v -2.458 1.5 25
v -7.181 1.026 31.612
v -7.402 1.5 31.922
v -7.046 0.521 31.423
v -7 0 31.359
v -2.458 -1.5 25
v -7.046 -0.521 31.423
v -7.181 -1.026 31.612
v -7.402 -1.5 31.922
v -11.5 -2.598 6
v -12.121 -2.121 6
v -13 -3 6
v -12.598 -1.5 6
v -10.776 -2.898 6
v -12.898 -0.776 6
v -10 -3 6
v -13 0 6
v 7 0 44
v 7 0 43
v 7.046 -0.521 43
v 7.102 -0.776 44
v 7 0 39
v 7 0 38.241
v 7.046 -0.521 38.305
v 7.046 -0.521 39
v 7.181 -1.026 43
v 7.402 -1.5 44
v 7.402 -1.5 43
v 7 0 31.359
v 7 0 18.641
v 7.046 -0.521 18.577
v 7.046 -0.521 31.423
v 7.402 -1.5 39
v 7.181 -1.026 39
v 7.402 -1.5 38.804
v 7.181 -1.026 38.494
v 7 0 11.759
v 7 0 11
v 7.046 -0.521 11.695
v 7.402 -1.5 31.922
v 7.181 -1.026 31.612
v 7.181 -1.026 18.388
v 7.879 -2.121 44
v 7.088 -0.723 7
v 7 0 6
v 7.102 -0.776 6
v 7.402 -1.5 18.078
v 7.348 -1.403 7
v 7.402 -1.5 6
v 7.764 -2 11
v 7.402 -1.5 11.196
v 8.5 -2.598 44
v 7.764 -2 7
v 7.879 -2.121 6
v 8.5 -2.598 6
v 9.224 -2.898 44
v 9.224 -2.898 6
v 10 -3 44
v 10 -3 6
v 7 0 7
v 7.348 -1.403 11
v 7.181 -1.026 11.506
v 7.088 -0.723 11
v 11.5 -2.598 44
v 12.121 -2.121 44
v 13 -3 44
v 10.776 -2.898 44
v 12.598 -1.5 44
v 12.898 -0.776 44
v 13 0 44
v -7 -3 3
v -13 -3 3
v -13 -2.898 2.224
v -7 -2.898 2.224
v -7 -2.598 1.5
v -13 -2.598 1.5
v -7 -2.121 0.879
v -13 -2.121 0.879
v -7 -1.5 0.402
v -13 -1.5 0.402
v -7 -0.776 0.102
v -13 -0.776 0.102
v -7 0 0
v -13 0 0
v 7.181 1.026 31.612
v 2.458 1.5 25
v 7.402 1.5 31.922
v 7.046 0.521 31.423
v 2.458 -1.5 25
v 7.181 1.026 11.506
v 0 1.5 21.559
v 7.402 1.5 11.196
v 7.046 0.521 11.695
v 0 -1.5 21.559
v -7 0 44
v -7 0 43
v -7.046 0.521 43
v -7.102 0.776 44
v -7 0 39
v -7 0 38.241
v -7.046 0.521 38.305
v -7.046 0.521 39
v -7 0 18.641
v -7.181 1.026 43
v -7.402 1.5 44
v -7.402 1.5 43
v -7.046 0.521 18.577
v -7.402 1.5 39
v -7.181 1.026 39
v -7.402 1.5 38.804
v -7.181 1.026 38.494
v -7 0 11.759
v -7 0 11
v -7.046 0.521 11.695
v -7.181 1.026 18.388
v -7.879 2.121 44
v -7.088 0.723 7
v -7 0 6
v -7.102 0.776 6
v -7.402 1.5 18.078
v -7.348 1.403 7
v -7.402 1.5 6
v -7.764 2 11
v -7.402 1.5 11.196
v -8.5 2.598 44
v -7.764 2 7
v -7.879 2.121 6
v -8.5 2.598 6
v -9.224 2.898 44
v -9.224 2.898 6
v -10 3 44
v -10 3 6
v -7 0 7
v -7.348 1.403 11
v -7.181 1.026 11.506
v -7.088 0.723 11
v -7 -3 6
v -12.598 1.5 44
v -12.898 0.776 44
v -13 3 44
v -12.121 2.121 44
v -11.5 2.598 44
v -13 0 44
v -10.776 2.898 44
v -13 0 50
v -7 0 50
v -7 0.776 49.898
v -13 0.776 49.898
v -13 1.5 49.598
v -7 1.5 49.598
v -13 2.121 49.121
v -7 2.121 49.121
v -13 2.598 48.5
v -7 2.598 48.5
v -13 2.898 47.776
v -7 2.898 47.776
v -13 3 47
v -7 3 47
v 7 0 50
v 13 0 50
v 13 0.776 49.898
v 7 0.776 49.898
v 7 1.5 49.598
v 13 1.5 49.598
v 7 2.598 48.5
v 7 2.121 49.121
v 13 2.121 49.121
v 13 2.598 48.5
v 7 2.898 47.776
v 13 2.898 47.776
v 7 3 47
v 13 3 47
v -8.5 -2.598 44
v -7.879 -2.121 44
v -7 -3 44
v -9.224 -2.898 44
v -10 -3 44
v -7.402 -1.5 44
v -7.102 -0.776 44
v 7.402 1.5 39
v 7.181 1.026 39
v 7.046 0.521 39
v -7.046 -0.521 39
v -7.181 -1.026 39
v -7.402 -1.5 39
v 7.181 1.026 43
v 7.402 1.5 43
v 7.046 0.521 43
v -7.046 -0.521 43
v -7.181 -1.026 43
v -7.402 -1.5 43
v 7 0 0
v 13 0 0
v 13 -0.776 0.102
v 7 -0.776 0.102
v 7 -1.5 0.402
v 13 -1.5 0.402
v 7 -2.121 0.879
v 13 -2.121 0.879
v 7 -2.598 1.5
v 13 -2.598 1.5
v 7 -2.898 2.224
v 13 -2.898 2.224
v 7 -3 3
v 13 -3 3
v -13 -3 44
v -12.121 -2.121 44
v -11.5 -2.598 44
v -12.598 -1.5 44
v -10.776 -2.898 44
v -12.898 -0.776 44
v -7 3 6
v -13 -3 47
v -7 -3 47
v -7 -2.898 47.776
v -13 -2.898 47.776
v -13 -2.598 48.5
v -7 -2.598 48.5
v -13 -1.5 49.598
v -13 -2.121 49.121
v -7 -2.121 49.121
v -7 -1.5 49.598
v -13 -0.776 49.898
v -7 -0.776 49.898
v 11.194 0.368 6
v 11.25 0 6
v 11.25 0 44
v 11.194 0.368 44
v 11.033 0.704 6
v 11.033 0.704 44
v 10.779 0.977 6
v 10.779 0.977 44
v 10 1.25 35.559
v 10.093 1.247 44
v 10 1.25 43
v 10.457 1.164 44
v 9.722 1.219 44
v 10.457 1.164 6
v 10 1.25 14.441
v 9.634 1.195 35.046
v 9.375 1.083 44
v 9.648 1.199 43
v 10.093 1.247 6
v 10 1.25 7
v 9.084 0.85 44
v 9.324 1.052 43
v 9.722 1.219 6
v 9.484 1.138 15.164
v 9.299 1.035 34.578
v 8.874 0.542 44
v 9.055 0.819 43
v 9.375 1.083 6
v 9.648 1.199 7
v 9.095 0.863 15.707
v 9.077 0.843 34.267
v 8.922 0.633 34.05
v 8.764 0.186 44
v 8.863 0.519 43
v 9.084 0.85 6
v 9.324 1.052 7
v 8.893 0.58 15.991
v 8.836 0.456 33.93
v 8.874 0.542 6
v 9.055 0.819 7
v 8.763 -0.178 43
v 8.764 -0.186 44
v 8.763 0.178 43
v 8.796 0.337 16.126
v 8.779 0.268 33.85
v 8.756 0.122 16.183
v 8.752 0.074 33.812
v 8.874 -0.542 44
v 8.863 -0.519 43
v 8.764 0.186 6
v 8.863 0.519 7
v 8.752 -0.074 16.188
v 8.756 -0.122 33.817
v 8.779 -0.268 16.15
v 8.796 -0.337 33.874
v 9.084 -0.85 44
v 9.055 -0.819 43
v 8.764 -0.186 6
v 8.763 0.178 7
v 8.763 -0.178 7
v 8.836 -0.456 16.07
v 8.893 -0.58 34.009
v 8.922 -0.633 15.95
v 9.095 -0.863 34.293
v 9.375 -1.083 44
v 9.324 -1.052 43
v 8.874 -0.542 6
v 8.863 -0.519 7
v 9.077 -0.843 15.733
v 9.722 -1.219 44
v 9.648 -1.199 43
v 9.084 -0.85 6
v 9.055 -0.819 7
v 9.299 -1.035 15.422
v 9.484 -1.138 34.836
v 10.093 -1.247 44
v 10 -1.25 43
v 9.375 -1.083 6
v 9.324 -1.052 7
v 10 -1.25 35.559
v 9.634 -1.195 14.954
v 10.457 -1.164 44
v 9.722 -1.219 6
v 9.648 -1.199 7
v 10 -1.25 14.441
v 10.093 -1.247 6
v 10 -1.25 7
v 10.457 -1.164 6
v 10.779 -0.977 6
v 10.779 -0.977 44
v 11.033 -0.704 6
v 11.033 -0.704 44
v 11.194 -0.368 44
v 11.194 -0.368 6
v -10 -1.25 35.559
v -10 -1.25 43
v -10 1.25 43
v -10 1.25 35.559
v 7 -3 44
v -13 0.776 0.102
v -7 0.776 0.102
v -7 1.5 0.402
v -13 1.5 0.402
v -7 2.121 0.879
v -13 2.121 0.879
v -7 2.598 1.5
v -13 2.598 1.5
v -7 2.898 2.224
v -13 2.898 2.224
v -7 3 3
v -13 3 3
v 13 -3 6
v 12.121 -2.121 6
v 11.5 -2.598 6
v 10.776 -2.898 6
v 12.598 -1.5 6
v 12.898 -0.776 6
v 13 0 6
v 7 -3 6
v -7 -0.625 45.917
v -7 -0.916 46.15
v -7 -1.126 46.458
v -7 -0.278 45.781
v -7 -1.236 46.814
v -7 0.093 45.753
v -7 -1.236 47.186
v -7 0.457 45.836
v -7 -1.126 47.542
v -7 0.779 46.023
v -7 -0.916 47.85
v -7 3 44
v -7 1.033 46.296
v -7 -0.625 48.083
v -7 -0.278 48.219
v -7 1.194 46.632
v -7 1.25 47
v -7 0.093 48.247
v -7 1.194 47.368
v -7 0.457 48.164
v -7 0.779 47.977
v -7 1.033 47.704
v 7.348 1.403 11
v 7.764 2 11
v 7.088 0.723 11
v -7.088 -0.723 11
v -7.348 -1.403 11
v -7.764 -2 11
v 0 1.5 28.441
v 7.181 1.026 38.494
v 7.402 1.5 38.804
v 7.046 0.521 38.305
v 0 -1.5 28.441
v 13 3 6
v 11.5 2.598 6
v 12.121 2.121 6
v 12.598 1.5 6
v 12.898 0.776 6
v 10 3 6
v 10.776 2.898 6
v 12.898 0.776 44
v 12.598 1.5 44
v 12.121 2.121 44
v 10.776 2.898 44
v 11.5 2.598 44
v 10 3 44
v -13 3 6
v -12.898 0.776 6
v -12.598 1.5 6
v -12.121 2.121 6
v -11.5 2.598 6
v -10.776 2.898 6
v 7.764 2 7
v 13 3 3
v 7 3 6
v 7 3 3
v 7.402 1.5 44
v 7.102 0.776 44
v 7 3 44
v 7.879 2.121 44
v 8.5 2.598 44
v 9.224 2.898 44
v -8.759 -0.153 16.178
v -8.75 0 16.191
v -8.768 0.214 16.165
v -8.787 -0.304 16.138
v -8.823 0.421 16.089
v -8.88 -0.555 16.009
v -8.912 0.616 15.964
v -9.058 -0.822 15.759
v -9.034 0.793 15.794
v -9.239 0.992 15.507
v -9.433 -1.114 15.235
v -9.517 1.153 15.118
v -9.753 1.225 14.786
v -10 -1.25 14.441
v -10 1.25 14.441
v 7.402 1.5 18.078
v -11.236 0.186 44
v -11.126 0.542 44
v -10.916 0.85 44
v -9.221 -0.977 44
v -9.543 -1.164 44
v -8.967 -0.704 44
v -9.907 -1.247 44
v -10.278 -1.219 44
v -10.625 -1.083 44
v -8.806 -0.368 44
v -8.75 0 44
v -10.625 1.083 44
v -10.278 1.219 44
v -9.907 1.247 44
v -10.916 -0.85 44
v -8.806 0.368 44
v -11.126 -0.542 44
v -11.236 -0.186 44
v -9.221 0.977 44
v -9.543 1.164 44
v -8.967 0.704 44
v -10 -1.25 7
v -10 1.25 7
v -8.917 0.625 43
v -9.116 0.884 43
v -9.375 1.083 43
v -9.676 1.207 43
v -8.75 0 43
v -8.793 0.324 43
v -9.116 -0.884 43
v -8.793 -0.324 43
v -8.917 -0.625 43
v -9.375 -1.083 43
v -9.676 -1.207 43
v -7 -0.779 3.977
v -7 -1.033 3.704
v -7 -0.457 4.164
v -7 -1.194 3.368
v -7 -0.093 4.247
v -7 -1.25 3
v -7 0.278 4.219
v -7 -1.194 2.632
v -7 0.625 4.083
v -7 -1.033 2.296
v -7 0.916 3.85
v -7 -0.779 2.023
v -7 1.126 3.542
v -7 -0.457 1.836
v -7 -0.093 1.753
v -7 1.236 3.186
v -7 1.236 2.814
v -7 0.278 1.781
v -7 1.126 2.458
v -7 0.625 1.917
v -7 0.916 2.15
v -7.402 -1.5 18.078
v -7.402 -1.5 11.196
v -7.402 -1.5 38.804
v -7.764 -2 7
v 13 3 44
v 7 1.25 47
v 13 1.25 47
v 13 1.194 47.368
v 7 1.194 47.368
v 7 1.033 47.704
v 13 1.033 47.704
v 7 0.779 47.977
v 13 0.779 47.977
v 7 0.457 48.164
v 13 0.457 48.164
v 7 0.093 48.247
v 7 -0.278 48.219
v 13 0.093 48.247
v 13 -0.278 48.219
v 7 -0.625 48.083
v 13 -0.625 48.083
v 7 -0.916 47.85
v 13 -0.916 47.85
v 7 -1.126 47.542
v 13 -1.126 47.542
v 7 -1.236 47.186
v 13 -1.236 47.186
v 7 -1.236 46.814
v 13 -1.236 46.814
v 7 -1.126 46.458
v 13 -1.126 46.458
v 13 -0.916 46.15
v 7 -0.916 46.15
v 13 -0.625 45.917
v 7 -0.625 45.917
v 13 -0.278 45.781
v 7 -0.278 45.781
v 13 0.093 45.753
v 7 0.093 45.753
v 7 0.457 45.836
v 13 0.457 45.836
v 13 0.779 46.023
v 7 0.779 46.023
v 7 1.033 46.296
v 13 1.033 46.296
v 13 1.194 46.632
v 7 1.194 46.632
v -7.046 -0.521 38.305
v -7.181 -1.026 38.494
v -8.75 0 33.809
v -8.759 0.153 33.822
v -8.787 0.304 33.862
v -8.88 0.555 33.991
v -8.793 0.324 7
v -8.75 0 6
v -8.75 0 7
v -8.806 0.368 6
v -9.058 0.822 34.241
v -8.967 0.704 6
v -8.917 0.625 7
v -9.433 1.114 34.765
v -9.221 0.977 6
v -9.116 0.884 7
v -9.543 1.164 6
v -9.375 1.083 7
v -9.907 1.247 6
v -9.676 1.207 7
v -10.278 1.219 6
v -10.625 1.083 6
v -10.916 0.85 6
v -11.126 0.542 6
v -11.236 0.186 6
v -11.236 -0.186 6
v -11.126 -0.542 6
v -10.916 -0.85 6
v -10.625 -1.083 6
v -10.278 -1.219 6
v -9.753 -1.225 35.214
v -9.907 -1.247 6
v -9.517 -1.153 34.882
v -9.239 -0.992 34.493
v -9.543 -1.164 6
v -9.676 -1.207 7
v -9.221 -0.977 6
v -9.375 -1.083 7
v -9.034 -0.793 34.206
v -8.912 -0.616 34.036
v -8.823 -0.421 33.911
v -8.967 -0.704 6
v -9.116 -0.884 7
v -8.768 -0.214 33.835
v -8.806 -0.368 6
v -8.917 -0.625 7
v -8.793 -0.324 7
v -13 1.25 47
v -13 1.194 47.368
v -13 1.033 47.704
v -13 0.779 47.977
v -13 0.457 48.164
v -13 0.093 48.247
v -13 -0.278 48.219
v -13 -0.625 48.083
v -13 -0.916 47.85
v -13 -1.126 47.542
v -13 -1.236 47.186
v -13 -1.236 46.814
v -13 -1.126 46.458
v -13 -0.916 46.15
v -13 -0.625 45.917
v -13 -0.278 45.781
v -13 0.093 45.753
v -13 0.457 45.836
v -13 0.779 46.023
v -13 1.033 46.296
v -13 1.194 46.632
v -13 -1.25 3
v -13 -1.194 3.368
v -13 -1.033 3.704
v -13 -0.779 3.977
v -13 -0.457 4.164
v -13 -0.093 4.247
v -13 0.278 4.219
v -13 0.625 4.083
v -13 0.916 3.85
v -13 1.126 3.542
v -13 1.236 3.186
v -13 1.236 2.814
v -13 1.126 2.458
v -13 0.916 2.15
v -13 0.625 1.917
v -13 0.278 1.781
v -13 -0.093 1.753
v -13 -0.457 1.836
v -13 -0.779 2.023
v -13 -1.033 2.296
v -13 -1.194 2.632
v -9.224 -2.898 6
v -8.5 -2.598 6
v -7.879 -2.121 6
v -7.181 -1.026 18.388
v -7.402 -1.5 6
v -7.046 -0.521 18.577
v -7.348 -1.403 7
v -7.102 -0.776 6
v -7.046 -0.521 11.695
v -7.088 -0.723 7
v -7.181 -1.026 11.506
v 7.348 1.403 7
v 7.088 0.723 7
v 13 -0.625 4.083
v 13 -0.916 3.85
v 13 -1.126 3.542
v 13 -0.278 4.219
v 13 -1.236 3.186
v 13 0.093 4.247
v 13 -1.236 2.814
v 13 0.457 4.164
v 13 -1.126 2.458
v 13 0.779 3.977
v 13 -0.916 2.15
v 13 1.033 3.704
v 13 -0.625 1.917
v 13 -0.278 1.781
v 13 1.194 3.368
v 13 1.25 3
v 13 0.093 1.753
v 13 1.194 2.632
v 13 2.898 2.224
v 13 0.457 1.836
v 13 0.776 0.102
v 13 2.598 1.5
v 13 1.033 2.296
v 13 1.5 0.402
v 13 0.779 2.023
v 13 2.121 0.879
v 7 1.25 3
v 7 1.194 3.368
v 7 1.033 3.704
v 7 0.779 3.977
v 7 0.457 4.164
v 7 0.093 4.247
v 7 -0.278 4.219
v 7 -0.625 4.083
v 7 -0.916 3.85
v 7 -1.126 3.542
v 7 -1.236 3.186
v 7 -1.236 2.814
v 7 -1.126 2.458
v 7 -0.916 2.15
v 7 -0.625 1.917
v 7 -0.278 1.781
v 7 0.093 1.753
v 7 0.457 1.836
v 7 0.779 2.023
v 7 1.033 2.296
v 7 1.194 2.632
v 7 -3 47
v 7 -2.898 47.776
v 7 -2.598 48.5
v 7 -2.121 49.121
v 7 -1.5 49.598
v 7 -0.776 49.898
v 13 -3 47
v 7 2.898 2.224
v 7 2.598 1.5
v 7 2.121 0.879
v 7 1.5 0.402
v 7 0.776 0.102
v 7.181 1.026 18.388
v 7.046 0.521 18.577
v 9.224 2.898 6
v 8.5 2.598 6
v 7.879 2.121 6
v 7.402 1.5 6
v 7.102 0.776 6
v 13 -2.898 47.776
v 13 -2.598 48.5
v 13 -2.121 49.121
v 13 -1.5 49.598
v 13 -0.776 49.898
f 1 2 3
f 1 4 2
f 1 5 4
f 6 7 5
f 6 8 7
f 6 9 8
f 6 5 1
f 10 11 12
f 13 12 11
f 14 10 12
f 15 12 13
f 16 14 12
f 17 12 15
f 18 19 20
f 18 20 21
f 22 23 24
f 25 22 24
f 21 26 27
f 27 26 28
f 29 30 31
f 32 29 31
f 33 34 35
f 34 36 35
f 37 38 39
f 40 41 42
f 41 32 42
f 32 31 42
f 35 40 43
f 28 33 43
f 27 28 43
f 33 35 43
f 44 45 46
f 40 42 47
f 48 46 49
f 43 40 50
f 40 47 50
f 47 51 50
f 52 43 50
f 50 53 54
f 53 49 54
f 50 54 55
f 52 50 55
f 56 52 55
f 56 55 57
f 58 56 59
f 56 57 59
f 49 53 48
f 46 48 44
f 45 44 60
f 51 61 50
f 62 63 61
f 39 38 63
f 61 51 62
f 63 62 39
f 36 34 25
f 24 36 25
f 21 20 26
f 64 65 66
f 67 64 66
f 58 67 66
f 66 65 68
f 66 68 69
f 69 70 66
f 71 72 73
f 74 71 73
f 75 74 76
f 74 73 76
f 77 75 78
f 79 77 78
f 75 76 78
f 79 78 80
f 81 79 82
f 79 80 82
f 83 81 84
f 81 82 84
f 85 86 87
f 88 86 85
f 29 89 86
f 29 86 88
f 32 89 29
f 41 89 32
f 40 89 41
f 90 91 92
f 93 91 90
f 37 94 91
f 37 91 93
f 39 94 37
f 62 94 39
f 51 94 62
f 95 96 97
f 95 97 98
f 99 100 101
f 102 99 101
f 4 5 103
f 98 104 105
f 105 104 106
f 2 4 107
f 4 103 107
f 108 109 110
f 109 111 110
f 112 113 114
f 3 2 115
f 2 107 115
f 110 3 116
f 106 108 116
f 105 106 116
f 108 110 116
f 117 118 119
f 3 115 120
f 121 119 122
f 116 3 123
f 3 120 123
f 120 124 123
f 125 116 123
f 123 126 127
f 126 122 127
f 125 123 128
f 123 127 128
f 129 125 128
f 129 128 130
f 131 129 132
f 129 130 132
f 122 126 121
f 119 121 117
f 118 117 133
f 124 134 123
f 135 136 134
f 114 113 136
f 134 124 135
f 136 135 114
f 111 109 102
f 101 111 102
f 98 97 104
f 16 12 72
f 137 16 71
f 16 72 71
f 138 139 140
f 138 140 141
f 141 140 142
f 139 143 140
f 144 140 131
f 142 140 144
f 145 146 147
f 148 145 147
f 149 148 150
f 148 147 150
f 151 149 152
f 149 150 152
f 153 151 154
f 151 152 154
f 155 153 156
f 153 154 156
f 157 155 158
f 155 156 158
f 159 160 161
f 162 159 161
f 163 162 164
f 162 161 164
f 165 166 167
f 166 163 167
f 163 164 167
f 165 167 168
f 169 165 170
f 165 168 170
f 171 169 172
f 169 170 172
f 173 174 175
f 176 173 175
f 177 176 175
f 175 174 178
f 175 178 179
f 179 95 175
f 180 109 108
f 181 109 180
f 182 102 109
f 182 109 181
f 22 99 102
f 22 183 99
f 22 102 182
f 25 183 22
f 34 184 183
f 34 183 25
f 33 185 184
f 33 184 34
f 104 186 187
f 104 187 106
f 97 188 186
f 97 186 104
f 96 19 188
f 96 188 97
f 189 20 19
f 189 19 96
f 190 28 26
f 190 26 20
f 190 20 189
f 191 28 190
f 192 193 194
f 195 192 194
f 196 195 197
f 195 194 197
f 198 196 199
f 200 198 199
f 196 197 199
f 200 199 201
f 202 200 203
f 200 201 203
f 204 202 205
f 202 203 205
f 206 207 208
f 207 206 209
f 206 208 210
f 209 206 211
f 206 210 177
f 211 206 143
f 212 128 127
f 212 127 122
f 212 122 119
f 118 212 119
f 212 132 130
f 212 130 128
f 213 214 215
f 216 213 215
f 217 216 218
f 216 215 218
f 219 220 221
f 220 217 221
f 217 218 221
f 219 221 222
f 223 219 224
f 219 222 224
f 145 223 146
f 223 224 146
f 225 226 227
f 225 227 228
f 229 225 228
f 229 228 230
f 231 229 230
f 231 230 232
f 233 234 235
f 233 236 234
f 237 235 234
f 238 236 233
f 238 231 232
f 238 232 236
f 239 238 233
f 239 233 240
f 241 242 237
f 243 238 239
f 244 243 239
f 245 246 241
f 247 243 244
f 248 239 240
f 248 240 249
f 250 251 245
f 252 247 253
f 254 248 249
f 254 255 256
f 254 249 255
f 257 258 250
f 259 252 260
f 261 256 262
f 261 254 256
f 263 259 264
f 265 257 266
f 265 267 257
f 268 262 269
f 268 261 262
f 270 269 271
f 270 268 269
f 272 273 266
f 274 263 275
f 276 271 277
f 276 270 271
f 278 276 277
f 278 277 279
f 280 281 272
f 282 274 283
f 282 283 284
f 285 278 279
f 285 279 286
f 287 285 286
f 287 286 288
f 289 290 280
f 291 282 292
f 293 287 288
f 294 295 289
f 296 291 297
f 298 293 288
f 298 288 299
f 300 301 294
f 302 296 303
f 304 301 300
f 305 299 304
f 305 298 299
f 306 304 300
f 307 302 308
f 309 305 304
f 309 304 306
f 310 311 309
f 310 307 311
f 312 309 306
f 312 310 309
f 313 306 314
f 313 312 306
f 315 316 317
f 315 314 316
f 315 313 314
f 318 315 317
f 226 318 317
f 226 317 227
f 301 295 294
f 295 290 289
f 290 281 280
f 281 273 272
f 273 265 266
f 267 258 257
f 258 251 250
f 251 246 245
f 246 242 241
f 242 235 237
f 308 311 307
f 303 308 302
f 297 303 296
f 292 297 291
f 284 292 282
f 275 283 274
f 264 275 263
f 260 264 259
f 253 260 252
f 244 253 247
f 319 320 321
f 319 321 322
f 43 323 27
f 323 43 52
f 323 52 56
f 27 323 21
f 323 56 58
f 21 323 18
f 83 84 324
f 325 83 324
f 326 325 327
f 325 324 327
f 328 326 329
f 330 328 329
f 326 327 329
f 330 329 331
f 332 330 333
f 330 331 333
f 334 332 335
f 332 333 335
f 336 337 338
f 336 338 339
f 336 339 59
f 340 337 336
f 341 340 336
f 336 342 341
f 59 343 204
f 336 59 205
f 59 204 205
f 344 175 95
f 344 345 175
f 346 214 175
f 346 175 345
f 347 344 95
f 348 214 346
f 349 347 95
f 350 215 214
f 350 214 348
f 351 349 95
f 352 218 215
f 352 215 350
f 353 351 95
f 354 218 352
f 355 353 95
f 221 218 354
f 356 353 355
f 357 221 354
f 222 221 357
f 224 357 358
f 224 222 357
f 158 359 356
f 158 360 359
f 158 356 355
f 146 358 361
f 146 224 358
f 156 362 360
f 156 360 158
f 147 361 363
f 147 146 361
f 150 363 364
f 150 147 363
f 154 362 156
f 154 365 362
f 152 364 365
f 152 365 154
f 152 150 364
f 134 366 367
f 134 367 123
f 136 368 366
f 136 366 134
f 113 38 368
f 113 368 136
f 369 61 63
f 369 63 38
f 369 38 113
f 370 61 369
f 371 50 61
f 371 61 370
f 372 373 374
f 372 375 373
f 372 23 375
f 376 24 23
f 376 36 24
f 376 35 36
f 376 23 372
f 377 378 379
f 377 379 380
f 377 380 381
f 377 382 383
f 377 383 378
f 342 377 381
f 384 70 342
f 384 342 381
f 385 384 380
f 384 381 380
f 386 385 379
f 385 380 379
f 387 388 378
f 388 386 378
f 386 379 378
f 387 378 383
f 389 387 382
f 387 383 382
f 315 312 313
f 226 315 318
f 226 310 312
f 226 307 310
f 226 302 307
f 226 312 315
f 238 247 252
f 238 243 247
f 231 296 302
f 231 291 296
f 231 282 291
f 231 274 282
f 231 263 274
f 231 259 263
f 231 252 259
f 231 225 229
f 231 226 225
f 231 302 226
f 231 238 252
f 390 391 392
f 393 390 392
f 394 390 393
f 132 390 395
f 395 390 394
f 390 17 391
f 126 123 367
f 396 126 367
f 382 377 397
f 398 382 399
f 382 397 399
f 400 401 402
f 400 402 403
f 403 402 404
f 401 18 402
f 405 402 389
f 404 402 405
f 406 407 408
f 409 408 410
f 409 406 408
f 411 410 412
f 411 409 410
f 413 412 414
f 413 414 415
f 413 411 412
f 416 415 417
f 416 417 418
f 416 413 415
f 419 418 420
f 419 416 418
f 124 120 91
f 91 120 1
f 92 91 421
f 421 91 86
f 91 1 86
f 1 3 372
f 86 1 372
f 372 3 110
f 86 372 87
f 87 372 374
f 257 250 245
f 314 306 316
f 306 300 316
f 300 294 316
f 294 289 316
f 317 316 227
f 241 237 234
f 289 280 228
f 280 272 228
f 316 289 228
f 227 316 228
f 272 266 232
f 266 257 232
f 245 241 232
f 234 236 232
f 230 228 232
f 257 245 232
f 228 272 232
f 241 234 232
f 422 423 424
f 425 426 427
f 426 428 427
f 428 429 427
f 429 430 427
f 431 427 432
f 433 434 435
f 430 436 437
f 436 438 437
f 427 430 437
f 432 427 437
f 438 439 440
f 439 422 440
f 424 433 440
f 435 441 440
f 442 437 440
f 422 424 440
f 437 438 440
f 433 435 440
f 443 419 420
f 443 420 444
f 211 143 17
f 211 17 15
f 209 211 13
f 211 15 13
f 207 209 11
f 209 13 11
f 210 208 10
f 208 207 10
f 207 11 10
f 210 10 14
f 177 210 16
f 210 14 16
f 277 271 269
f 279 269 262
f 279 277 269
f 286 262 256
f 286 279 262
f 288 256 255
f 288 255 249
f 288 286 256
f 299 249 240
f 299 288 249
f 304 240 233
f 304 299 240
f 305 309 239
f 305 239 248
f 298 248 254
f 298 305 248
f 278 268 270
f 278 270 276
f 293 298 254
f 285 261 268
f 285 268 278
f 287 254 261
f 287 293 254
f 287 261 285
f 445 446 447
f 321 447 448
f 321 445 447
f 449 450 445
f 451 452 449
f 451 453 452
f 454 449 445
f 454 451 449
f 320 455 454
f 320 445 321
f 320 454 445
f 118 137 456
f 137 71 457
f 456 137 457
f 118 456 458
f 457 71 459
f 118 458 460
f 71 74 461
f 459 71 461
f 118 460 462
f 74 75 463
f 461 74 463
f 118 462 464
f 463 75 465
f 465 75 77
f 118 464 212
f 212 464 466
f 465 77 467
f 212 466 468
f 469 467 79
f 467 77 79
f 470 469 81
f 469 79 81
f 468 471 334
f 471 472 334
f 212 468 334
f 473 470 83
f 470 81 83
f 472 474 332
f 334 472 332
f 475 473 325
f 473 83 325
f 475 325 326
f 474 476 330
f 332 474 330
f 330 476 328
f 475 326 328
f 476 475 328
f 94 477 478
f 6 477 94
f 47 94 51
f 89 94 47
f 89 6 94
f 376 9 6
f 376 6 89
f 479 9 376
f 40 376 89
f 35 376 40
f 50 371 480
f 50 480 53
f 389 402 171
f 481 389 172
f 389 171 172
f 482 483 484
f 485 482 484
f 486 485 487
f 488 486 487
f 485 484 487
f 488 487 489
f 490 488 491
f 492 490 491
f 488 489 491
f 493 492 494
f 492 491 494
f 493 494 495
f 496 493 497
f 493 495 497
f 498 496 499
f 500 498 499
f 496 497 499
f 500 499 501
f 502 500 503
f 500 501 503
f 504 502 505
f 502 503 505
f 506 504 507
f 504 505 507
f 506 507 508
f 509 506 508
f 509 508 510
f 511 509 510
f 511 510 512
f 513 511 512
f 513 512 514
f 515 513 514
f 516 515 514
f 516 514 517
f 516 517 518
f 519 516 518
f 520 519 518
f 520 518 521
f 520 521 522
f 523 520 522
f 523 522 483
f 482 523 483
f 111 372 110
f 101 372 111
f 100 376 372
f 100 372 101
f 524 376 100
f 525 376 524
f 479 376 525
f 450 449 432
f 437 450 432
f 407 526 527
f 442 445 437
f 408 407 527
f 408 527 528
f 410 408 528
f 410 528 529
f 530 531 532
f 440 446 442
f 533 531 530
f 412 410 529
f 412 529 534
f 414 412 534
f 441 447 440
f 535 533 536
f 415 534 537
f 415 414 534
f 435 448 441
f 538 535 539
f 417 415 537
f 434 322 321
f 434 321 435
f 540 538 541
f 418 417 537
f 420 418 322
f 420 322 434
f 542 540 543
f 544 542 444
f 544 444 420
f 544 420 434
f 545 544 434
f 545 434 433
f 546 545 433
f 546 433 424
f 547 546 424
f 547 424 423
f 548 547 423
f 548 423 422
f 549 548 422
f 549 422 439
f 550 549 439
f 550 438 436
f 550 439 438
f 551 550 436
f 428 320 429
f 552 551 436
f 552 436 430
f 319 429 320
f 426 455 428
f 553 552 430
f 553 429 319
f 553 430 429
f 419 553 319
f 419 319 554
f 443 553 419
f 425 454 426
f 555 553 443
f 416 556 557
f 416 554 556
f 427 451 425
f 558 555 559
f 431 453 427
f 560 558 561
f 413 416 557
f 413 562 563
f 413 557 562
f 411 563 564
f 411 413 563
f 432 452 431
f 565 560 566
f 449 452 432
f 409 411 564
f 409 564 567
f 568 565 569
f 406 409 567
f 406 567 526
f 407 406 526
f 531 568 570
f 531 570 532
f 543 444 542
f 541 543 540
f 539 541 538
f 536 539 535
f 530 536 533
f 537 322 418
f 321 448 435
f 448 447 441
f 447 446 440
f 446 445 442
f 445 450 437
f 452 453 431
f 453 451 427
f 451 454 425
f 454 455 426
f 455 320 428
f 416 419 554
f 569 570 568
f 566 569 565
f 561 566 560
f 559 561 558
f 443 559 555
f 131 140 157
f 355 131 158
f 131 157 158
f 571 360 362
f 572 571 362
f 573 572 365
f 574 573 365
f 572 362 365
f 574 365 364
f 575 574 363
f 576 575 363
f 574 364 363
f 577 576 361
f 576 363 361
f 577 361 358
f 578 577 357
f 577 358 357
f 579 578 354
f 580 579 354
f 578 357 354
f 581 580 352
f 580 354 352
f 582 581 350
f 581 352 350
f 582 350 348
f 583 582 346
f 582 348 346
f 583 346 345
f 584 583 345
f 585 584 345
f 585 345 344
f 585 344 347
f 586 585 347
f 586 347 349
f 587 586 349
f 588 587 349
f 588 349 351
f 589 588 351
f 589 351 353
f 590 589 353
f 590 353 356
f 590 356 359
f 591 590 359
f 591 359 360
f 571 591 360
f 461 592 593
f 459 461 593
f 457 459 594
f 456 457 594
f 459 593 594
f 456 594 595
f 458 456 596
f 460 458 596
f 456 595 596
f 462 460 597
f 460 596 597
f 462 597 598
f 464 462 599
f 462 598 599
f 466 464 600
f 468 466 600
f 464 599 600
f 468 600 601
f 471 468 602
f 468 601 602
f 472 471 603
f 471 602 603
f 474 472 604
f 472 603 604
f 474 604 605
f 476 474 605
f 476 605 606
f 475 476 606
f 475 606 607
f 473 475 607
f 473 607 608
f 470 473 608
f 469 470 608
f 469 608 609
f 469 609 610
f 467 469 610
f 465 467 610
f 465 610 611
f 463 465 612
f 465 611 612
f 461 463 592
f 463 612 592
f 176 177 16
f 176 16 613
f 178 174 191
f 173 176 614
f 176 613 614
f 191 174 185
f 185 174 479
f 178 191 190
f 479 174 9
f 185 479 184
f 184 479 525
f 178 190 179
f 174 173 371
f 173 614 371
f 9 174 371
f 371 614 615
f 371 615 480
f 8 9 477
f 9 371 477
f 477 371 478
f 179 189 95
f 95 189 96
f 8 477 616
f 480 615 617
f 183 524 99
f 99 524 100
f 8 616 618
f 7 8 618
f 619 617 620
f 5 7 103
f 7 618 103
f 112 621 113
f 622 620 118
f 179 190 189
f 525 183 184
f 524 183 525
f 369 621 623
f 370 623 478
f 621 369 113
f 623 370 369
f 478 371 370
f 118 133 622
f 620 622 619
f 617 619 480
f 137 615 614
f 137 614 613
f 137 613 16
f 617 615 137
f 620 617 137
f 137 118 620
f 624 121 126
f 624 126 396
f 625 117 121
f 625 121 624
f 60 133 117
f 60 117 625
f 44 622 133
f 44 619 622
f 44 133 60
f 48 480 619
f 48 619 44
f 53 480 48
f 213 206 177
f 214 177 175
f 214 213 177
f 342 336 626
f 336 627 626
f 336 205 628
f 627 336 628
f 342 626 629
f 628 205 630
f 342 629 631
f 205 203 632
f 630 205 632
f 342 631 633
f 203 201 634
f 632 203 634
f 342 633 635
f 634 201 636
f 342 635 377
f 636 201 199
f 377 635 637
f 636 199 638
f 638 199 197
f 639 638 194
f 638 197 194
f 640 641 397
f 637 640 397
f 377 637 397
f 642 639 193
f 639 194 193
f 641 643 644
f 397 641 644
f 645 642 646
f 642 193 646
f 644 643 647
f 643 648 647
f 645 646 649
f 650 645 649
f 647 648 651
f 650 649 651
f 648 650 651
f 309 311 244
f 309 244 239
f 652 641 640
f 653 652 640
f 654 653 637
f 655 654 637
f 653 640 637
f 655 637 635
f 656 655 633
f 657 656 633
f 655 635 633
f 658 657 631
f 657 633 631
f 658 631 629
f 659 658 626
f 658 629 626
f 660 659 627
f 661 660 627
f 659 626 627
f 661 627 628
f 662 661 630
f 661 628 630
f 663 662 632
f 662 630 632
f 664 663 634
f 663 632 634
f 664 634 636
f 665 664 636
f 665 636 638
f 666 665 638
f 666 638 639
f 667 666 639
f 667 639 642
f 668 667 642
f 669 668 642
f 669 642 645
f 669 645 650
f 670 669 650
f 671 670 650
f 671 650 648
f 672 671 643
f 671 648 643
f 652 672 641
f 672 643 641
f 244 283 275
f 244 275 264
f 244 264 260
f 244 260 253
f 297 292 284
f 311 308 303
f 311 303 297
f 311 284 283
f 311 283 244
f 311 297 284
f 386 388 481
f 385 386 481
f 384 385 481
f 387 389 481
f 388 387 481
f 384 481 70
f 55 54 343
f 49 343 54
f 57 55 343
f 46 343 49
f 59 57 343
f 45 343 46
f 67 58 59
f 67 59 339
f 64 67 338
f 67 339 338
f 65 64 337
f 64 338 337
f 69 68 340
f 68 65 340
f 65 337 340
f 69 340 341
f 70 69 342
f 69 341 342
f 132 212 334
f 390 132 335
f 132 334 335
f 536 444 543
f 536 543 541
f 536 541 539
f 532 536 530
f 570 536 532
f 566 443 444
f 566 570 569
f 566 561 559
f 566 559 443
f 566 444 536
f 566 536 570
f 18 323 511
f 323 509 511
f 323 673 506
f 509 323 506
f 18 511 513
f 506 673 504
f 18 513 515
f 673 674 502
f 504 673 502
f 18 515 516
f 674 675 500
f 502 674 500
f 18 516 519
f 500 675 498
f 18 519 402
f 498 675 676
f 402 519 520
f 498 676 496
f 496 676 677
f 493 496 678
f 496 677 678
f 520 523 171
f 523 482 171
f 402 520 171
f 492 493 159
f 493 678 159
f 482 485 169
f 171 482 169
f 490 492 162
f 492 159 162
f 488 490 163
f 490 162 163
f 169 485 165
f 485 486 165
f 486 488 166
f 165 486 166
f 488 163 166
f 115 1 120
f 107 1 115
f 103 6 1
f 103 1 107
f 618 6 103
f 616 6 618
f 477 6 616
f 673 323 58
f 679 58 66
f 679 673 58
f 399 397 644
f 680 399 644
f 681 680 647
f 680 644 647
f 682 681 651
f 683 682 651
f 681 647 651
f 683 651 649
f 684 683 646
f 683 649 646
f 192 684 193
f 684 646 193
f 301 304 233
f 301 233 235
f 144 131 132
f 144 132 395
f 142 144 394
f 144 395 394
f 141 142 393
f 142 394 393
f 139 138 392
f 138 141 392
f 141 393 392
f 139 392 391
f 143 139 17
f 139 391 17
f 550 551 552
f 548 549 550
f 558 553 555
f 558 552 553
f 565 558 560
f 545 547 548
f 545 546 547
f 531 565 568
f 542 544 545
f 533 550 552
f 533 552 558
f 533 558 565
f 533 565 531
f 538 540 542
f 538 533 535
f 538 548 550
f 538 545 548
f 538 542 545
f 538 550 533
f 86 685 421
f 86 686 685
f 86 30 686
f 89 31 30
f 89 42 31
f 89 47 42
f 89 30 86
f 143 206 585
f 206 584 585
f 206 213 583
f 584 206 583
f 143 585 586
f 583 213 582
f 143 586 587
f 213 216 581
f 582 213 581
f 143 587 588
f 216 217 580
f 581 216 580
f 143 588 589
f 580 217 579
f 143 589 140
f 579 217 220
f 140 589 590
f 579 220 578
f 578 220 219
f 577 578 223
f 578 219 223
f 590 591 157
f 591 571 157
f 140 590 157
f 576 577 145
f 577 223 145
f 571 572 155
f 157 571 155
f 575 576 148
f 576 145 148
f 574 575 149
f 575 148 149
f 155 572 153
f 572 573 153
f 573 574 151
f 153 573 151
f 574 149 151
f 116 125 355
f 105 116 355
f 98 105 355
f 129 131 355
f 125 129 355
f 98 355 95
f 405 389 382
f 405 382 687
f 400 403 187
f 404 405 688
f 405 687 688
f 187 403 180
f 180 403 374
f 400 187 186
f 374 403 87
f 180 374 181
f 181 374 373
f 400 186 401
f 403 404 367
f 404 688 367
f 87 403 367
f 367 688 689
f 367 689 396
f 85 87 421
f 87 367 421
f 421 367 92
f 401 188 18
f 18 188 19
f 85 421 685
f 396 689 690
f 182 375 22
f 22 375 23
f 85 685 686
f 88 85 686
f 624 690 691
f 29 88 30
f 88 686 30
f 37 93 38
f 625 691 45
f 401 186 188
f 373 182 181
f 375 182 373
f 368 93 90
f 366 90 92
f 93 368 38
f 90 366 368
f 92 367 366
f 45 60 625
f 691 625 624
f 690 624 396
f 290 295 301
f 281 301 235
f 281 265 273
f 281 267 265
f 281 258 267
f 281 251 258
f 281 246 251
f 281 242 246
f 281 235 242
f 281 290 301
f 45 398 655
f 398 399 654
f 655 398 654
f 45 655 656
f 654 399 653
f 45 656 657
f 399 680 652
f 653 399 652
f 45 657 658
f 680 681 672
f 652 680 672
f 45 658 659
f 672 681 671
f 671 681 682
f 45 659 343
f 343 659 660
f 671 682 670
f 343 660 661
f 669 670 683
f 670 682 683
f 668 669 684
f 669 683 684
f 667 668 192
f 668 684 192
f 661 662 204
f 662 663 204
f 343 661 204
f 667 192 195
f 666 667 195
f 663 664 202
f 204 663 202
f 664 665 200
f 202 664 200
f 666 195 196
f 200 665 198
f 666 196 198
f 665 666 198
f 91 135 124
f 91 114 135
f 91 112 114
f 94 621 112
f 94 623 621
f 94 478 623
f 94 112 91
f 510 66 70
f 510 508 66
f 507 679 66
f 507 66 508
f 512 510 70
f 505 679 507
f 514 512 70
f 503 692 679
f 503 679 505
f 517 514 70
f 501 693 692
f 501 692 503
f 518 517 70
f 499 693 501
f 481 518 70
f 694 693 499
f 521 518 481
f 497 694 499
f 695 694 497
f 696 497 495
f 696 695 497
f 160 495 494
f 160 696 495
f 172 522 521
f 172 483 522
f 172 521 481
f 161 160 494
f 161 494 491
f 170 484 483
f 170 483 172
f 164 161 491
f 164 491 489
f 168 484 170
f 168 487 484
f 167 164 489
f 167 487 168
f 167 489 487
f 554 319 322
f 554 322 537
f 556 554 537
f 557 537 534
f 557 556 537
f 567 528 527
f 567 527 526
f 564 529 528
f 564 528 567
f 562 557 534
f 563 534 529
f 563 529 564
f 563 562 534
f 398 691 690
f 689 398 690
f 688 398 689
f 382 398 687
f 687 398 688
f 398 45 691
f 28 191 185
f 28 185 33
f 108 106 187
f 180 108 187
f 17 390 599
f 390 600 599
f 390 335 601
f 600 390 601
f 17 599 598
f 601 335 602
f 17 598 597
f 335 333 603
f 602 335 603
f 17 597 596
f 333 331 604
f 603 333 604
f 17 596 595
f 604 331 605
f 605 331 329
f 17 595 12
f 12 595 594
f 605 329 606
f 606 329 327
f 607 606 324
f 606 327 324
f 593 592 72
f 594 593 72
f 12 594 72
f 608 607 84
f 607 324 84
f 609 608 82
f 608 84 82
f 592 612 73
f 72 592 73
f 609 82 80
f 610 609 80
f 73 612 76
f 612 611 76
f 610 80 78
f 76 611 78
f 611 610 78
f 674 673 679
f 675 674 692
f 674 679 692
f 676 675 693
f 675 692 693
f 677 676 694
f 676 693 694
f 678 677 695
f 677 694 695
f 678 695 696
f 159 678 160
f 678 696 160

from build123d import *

# Parameters (mm, degrees)
F0_R      = 1.25
F1_DEPTH  = 6
F2_DEPTH  = 50
F3_DEPTH  = 50
F4_R      = 1.25
F5_DEPTH  = 6
F6_R      = 1.25
F7_DEPTH  = 6
F9_DEPTH  = 2
F11_DEPTH = 1.5
F10_W     = 6
F10_H     = 6
F12_DEPTH = 6
F13_R     = 1.25
F14_DEPTH = 30


with BuildPart() as f1:
    # F0 (on Top) → F1 (new body)
    with BuildSketch(Plane.XY):
        with BuildLine():
            ThreePointArc((10, -3), (12.1213203436, -2.1213203436), (13, 0))
            ThreePointArc((13, 0), (12.1213203436, 2.1213203436), (10, 3))
            ThreePointArc((10, 3), (7.8786796564, 2.1213203436), (7, 0))
            ThreePointArc((7, 0), (7.8786796564, -2.1213203436), (10, -3))
        make_face()
        with Locations((10, 0)):
            Circle(F0_R, mode=Mode.SUBTRACT)
        with BuildLine():
            ThreePointArc((7, 0), (7.8786796564, 2.1213203436), (10, 3))
            Line((10, 3), (7, 3))
            Line((7, 3), (7, 0))
        make_face()
        with BuildLine():
            Line((7, -3), (10, -3))
            ThreePointArc((10, -3), (7.8786796564, -2.1213203436), (7, 0))
            Line((7, 0), (7, -3))
        make_face()
        with BuildLine():
            Line((13, -3), (13, 0))
            ThreePointArc((13, 0), (12.1213203436, -2.1213203436), (10, -3))
            Line((10, -3), (13, -3))
        make_face()
        with BuildLine():
            ThreePointArc((10, 3), (12.1213203436, 2.1213203436), (13, 0))
            Line((13, 0), (13, 3))
            Line((13, 3), (10, 3))
        make_face()
        with Locations((10, 0)):
            Circle(F0_R)
    extrude(amount=F1_DEPTH)

    # F0 (on Top) → F2 (join)
    with BuildSketch(Plane.XY):
        with BuildLine():
            ThreePointArc((10, -3), (12.1213203436, -2.1213203436), (13, 0))
            ThreePointArc((13, 0), (12.1213203436, 2.1213203436), (10, 3))
            ThreePointArc((10, 3), (7.8786796564, 2.1213203436), (7, 0))
            ThreePointArc((7, 0), (7.8786796564, -2.1213203436), (10, -3))
        make_face()
        with Locations((10, 0)):
            Circle(F0_R, mode=Mode.SUBTRACT)
    extrude(amount=F2_DEPTH)

    # F4 (on face) → F5 (cut)
    with BuildSketch(Plane.YZ.offset(13)):
        with Locations((0, 3)):
            Circle(F4_R)
        with BuildLine():
            Line((-3, 0), (0, 0))
            ThreePointArc((0, 0), (-2.1213203436, 0.8786796564), (-3, 3))
            Line((-3, 3), (-3, 0))
        make_face()
        with BuildLine():
            Line((3, 0), (3, 3))
            ThreePointArc((3, 3), (2.1213203436, 0.8786796564), (0, 0))
            Line((0, 0), (3, 0))
        make_face()
    extrude(amount=-F5_DEPTH, mode=Mode.SUBTRACT)



with BuildPart() as f1b:
    # F0 (on Top) → F1, piece 2 (new body)
    with BuildSketch(Plane.XY):
        with BuildLine():
            ThreePointArc((-10, 3), (-7.8786796564, 2.1213203436), (-7, 0))
            Line((-7, 0), (-7, 3))
            Line((-7, 3), (-10, 3))
        make_face()
        with BuildLine():
            ThreePointArc((-13, 0), (-12.1213203436, 2.1213203436), (-10, 3))
            Line((-10, 3), (-13, 3))
            Line((-13, 3), (-13, 0))
        make_face()
        with BuildLine():
            ThreePointArc((-10, -3), (-7.8786796564, -2.1213203436), (-7, 0))
            ThreePointArc((-7, 0), (-7.8786796564, 2.1213203436), (-10, 3))
            ThreePointArc((-10, 3), (-12.1213203436, 2.1213203436), (-13, 0))
            ThreePointArc((-13, 0), (-12.1213203436, -2.1213203436), (-10, -3))
        make_face()
        with Locations((-10, 0)):
            Circle(F0_R, mode=Mode.SUBTRACT)
        with BuildLine():
            Line((-13, -3), (-10, -3))
            ThreePointArc((-10, -3), (-12.1213203436, -2.1213203436), (-13, 0))
            Line((-13, 0), (-13, -3))
        make_face()
        with BuildLine():
            Line((-7, -3), (-7, 0))
            ThreePointArc((-7, 0), (-7.8786796564, -2.1213203436), (-10, -3))
            Line((-10, -3), (-7, -3))
        make_face()
        with Locations((-10, 0)):
            Circle(F0_R)
    extrude(amount=F1_DEPTH)

    # F0 (on Top) → F3 (join)
    with BuildSketch(Plane.XY):
        with BuildLine():
            ThreePointArc((-10, -3), (-7.8786796564, -2.1213203436), (-7, 0))
            ThreePointArc((-7, 0), (-7.8786796564, 2.1213203436), (-10, 3))
            ThreePointArc((-10, 3), (-12.1213203436, 2.1213203436), (-13, 0))
            ThreePointArc((-13, 0), (-12.1213203436, -2.1213203436), (-10, -3))
        make_face()
        with Locations((-10, 0)):
            Circle(F0_R, mode=Mode.SUBTRACT)
    extrude(amount=F3_DEPTH)

    # F6 (on face) → F7 (cut)
    with BuildSketch(Plane(origin=(-13, 0, 0), x_dir=(0, -1, 0), z_dir=(-1, 0, 0))):
        with Locations((0, 3)):
            Circle(F6_R)
        with BuildLine():
            Line((-3, 0), (0, 0))
            ThreePointArc((0, 0), (-2.1213203436, 0.8786796564), (-3, 3))
            Line((-3, 3), (-3, 0))
        make_face()
        with BuildLine():
            Line((3, 0), (3, 3))
            ThreePointArc((3, 3), (2.1213203436, 0.8786796564), (0, 0))
            Line((0, 0), (3, 0))
        make_face()
    extrude(amount=-F7_DEPTH, mode=Mode.SUBTRACT)


with BuildPart() as f9:
    # F8 (on Front) → F9 (new body, symmetric)
    with BuildSketch(Plane.XZ):
        Polygon((-10, 7), (10, 7), (10, 11), (7.5421927808, 11), (-7.5421927808, 11), (-10, 11), align=None)
    extrude(amount=F9_DEPTH, both=True)


with BuildPart() as f1_1:
    add(f1.part)

    add(f1b.part)  # F11 merges F1b

    add(f9.part)  # F11 merges F9
    # F8 (on Front) → F11 (join, symmetric)
    with BuildSketch(Plane.XZ):
        Polygon((-10, 39), (-10, 35.5590698932), (-2.4578072192, 25), (0, 28.4409301068), (-7.5421927808, 39), align=None)
        Polygon((-2.4578072192, 25), (0, 21.5590698932), (2.4578072192, 25), (0, 28.4409301068), align=None)
        Polygon((7.5421927808, 11), (10, 11), (10, 14.4409301068), (2.4578072192, 25), (0, 21.5590698932), align=None)
        Polygon((-10, 14.4409301068), (-10, 11), (-7.5421927808, 11), (0, 21.5590698932), (-2.4578072192, 25), align=None)
        Polygon((2.4578072192, 25), (10, 35.5590698932), (10, 39), (7.5421927808, 39), (0, 28.4409301068), align=None)
        Polygon((7.5421927808, 39), (10, 39), (10, 43), (-10, 43), (-10, 39), (-7.5421927808, 39), align=None)
    extrude(amount=F11_DEPTH, both=True)

    # F10 (on face) → F12 (join)
    with BuildSketch(Plane.XY.offset(50)):
        with Locations((-10, 0)):
            Rectangle(F10_W, F10_H)
        with Locations((10, 0)):
            Rectangle(F10_W, F10_H)
    extrude(amount=-F12_DEPTH)

    # F13 (on face) → F14 (cut)
    with BuildSketch(Plane.YZ.offset(13)):
        with Locations((0, 47)):
            Circle(F13_R)
        with BuildLine():
            Line((-3, 50), (-3, 47))
            ThreePointArc((-3, 47), (-2.1213203436, 49.1213203436), (0, 50))
            Line((0, 50), (-3, 50))
        make_face()
        with BuildLine():
            ThreePointArc((0, 50), (2.1213203436, 49.1213203436), (3, 47))
            Line((3, 47), (3, 50))
            Line((3, 50), (0, 50))
        make_face()
    extrude(amount=-F14_DEPTH, mode=Mode.SUBTRACT)


solid = f1_1.part
